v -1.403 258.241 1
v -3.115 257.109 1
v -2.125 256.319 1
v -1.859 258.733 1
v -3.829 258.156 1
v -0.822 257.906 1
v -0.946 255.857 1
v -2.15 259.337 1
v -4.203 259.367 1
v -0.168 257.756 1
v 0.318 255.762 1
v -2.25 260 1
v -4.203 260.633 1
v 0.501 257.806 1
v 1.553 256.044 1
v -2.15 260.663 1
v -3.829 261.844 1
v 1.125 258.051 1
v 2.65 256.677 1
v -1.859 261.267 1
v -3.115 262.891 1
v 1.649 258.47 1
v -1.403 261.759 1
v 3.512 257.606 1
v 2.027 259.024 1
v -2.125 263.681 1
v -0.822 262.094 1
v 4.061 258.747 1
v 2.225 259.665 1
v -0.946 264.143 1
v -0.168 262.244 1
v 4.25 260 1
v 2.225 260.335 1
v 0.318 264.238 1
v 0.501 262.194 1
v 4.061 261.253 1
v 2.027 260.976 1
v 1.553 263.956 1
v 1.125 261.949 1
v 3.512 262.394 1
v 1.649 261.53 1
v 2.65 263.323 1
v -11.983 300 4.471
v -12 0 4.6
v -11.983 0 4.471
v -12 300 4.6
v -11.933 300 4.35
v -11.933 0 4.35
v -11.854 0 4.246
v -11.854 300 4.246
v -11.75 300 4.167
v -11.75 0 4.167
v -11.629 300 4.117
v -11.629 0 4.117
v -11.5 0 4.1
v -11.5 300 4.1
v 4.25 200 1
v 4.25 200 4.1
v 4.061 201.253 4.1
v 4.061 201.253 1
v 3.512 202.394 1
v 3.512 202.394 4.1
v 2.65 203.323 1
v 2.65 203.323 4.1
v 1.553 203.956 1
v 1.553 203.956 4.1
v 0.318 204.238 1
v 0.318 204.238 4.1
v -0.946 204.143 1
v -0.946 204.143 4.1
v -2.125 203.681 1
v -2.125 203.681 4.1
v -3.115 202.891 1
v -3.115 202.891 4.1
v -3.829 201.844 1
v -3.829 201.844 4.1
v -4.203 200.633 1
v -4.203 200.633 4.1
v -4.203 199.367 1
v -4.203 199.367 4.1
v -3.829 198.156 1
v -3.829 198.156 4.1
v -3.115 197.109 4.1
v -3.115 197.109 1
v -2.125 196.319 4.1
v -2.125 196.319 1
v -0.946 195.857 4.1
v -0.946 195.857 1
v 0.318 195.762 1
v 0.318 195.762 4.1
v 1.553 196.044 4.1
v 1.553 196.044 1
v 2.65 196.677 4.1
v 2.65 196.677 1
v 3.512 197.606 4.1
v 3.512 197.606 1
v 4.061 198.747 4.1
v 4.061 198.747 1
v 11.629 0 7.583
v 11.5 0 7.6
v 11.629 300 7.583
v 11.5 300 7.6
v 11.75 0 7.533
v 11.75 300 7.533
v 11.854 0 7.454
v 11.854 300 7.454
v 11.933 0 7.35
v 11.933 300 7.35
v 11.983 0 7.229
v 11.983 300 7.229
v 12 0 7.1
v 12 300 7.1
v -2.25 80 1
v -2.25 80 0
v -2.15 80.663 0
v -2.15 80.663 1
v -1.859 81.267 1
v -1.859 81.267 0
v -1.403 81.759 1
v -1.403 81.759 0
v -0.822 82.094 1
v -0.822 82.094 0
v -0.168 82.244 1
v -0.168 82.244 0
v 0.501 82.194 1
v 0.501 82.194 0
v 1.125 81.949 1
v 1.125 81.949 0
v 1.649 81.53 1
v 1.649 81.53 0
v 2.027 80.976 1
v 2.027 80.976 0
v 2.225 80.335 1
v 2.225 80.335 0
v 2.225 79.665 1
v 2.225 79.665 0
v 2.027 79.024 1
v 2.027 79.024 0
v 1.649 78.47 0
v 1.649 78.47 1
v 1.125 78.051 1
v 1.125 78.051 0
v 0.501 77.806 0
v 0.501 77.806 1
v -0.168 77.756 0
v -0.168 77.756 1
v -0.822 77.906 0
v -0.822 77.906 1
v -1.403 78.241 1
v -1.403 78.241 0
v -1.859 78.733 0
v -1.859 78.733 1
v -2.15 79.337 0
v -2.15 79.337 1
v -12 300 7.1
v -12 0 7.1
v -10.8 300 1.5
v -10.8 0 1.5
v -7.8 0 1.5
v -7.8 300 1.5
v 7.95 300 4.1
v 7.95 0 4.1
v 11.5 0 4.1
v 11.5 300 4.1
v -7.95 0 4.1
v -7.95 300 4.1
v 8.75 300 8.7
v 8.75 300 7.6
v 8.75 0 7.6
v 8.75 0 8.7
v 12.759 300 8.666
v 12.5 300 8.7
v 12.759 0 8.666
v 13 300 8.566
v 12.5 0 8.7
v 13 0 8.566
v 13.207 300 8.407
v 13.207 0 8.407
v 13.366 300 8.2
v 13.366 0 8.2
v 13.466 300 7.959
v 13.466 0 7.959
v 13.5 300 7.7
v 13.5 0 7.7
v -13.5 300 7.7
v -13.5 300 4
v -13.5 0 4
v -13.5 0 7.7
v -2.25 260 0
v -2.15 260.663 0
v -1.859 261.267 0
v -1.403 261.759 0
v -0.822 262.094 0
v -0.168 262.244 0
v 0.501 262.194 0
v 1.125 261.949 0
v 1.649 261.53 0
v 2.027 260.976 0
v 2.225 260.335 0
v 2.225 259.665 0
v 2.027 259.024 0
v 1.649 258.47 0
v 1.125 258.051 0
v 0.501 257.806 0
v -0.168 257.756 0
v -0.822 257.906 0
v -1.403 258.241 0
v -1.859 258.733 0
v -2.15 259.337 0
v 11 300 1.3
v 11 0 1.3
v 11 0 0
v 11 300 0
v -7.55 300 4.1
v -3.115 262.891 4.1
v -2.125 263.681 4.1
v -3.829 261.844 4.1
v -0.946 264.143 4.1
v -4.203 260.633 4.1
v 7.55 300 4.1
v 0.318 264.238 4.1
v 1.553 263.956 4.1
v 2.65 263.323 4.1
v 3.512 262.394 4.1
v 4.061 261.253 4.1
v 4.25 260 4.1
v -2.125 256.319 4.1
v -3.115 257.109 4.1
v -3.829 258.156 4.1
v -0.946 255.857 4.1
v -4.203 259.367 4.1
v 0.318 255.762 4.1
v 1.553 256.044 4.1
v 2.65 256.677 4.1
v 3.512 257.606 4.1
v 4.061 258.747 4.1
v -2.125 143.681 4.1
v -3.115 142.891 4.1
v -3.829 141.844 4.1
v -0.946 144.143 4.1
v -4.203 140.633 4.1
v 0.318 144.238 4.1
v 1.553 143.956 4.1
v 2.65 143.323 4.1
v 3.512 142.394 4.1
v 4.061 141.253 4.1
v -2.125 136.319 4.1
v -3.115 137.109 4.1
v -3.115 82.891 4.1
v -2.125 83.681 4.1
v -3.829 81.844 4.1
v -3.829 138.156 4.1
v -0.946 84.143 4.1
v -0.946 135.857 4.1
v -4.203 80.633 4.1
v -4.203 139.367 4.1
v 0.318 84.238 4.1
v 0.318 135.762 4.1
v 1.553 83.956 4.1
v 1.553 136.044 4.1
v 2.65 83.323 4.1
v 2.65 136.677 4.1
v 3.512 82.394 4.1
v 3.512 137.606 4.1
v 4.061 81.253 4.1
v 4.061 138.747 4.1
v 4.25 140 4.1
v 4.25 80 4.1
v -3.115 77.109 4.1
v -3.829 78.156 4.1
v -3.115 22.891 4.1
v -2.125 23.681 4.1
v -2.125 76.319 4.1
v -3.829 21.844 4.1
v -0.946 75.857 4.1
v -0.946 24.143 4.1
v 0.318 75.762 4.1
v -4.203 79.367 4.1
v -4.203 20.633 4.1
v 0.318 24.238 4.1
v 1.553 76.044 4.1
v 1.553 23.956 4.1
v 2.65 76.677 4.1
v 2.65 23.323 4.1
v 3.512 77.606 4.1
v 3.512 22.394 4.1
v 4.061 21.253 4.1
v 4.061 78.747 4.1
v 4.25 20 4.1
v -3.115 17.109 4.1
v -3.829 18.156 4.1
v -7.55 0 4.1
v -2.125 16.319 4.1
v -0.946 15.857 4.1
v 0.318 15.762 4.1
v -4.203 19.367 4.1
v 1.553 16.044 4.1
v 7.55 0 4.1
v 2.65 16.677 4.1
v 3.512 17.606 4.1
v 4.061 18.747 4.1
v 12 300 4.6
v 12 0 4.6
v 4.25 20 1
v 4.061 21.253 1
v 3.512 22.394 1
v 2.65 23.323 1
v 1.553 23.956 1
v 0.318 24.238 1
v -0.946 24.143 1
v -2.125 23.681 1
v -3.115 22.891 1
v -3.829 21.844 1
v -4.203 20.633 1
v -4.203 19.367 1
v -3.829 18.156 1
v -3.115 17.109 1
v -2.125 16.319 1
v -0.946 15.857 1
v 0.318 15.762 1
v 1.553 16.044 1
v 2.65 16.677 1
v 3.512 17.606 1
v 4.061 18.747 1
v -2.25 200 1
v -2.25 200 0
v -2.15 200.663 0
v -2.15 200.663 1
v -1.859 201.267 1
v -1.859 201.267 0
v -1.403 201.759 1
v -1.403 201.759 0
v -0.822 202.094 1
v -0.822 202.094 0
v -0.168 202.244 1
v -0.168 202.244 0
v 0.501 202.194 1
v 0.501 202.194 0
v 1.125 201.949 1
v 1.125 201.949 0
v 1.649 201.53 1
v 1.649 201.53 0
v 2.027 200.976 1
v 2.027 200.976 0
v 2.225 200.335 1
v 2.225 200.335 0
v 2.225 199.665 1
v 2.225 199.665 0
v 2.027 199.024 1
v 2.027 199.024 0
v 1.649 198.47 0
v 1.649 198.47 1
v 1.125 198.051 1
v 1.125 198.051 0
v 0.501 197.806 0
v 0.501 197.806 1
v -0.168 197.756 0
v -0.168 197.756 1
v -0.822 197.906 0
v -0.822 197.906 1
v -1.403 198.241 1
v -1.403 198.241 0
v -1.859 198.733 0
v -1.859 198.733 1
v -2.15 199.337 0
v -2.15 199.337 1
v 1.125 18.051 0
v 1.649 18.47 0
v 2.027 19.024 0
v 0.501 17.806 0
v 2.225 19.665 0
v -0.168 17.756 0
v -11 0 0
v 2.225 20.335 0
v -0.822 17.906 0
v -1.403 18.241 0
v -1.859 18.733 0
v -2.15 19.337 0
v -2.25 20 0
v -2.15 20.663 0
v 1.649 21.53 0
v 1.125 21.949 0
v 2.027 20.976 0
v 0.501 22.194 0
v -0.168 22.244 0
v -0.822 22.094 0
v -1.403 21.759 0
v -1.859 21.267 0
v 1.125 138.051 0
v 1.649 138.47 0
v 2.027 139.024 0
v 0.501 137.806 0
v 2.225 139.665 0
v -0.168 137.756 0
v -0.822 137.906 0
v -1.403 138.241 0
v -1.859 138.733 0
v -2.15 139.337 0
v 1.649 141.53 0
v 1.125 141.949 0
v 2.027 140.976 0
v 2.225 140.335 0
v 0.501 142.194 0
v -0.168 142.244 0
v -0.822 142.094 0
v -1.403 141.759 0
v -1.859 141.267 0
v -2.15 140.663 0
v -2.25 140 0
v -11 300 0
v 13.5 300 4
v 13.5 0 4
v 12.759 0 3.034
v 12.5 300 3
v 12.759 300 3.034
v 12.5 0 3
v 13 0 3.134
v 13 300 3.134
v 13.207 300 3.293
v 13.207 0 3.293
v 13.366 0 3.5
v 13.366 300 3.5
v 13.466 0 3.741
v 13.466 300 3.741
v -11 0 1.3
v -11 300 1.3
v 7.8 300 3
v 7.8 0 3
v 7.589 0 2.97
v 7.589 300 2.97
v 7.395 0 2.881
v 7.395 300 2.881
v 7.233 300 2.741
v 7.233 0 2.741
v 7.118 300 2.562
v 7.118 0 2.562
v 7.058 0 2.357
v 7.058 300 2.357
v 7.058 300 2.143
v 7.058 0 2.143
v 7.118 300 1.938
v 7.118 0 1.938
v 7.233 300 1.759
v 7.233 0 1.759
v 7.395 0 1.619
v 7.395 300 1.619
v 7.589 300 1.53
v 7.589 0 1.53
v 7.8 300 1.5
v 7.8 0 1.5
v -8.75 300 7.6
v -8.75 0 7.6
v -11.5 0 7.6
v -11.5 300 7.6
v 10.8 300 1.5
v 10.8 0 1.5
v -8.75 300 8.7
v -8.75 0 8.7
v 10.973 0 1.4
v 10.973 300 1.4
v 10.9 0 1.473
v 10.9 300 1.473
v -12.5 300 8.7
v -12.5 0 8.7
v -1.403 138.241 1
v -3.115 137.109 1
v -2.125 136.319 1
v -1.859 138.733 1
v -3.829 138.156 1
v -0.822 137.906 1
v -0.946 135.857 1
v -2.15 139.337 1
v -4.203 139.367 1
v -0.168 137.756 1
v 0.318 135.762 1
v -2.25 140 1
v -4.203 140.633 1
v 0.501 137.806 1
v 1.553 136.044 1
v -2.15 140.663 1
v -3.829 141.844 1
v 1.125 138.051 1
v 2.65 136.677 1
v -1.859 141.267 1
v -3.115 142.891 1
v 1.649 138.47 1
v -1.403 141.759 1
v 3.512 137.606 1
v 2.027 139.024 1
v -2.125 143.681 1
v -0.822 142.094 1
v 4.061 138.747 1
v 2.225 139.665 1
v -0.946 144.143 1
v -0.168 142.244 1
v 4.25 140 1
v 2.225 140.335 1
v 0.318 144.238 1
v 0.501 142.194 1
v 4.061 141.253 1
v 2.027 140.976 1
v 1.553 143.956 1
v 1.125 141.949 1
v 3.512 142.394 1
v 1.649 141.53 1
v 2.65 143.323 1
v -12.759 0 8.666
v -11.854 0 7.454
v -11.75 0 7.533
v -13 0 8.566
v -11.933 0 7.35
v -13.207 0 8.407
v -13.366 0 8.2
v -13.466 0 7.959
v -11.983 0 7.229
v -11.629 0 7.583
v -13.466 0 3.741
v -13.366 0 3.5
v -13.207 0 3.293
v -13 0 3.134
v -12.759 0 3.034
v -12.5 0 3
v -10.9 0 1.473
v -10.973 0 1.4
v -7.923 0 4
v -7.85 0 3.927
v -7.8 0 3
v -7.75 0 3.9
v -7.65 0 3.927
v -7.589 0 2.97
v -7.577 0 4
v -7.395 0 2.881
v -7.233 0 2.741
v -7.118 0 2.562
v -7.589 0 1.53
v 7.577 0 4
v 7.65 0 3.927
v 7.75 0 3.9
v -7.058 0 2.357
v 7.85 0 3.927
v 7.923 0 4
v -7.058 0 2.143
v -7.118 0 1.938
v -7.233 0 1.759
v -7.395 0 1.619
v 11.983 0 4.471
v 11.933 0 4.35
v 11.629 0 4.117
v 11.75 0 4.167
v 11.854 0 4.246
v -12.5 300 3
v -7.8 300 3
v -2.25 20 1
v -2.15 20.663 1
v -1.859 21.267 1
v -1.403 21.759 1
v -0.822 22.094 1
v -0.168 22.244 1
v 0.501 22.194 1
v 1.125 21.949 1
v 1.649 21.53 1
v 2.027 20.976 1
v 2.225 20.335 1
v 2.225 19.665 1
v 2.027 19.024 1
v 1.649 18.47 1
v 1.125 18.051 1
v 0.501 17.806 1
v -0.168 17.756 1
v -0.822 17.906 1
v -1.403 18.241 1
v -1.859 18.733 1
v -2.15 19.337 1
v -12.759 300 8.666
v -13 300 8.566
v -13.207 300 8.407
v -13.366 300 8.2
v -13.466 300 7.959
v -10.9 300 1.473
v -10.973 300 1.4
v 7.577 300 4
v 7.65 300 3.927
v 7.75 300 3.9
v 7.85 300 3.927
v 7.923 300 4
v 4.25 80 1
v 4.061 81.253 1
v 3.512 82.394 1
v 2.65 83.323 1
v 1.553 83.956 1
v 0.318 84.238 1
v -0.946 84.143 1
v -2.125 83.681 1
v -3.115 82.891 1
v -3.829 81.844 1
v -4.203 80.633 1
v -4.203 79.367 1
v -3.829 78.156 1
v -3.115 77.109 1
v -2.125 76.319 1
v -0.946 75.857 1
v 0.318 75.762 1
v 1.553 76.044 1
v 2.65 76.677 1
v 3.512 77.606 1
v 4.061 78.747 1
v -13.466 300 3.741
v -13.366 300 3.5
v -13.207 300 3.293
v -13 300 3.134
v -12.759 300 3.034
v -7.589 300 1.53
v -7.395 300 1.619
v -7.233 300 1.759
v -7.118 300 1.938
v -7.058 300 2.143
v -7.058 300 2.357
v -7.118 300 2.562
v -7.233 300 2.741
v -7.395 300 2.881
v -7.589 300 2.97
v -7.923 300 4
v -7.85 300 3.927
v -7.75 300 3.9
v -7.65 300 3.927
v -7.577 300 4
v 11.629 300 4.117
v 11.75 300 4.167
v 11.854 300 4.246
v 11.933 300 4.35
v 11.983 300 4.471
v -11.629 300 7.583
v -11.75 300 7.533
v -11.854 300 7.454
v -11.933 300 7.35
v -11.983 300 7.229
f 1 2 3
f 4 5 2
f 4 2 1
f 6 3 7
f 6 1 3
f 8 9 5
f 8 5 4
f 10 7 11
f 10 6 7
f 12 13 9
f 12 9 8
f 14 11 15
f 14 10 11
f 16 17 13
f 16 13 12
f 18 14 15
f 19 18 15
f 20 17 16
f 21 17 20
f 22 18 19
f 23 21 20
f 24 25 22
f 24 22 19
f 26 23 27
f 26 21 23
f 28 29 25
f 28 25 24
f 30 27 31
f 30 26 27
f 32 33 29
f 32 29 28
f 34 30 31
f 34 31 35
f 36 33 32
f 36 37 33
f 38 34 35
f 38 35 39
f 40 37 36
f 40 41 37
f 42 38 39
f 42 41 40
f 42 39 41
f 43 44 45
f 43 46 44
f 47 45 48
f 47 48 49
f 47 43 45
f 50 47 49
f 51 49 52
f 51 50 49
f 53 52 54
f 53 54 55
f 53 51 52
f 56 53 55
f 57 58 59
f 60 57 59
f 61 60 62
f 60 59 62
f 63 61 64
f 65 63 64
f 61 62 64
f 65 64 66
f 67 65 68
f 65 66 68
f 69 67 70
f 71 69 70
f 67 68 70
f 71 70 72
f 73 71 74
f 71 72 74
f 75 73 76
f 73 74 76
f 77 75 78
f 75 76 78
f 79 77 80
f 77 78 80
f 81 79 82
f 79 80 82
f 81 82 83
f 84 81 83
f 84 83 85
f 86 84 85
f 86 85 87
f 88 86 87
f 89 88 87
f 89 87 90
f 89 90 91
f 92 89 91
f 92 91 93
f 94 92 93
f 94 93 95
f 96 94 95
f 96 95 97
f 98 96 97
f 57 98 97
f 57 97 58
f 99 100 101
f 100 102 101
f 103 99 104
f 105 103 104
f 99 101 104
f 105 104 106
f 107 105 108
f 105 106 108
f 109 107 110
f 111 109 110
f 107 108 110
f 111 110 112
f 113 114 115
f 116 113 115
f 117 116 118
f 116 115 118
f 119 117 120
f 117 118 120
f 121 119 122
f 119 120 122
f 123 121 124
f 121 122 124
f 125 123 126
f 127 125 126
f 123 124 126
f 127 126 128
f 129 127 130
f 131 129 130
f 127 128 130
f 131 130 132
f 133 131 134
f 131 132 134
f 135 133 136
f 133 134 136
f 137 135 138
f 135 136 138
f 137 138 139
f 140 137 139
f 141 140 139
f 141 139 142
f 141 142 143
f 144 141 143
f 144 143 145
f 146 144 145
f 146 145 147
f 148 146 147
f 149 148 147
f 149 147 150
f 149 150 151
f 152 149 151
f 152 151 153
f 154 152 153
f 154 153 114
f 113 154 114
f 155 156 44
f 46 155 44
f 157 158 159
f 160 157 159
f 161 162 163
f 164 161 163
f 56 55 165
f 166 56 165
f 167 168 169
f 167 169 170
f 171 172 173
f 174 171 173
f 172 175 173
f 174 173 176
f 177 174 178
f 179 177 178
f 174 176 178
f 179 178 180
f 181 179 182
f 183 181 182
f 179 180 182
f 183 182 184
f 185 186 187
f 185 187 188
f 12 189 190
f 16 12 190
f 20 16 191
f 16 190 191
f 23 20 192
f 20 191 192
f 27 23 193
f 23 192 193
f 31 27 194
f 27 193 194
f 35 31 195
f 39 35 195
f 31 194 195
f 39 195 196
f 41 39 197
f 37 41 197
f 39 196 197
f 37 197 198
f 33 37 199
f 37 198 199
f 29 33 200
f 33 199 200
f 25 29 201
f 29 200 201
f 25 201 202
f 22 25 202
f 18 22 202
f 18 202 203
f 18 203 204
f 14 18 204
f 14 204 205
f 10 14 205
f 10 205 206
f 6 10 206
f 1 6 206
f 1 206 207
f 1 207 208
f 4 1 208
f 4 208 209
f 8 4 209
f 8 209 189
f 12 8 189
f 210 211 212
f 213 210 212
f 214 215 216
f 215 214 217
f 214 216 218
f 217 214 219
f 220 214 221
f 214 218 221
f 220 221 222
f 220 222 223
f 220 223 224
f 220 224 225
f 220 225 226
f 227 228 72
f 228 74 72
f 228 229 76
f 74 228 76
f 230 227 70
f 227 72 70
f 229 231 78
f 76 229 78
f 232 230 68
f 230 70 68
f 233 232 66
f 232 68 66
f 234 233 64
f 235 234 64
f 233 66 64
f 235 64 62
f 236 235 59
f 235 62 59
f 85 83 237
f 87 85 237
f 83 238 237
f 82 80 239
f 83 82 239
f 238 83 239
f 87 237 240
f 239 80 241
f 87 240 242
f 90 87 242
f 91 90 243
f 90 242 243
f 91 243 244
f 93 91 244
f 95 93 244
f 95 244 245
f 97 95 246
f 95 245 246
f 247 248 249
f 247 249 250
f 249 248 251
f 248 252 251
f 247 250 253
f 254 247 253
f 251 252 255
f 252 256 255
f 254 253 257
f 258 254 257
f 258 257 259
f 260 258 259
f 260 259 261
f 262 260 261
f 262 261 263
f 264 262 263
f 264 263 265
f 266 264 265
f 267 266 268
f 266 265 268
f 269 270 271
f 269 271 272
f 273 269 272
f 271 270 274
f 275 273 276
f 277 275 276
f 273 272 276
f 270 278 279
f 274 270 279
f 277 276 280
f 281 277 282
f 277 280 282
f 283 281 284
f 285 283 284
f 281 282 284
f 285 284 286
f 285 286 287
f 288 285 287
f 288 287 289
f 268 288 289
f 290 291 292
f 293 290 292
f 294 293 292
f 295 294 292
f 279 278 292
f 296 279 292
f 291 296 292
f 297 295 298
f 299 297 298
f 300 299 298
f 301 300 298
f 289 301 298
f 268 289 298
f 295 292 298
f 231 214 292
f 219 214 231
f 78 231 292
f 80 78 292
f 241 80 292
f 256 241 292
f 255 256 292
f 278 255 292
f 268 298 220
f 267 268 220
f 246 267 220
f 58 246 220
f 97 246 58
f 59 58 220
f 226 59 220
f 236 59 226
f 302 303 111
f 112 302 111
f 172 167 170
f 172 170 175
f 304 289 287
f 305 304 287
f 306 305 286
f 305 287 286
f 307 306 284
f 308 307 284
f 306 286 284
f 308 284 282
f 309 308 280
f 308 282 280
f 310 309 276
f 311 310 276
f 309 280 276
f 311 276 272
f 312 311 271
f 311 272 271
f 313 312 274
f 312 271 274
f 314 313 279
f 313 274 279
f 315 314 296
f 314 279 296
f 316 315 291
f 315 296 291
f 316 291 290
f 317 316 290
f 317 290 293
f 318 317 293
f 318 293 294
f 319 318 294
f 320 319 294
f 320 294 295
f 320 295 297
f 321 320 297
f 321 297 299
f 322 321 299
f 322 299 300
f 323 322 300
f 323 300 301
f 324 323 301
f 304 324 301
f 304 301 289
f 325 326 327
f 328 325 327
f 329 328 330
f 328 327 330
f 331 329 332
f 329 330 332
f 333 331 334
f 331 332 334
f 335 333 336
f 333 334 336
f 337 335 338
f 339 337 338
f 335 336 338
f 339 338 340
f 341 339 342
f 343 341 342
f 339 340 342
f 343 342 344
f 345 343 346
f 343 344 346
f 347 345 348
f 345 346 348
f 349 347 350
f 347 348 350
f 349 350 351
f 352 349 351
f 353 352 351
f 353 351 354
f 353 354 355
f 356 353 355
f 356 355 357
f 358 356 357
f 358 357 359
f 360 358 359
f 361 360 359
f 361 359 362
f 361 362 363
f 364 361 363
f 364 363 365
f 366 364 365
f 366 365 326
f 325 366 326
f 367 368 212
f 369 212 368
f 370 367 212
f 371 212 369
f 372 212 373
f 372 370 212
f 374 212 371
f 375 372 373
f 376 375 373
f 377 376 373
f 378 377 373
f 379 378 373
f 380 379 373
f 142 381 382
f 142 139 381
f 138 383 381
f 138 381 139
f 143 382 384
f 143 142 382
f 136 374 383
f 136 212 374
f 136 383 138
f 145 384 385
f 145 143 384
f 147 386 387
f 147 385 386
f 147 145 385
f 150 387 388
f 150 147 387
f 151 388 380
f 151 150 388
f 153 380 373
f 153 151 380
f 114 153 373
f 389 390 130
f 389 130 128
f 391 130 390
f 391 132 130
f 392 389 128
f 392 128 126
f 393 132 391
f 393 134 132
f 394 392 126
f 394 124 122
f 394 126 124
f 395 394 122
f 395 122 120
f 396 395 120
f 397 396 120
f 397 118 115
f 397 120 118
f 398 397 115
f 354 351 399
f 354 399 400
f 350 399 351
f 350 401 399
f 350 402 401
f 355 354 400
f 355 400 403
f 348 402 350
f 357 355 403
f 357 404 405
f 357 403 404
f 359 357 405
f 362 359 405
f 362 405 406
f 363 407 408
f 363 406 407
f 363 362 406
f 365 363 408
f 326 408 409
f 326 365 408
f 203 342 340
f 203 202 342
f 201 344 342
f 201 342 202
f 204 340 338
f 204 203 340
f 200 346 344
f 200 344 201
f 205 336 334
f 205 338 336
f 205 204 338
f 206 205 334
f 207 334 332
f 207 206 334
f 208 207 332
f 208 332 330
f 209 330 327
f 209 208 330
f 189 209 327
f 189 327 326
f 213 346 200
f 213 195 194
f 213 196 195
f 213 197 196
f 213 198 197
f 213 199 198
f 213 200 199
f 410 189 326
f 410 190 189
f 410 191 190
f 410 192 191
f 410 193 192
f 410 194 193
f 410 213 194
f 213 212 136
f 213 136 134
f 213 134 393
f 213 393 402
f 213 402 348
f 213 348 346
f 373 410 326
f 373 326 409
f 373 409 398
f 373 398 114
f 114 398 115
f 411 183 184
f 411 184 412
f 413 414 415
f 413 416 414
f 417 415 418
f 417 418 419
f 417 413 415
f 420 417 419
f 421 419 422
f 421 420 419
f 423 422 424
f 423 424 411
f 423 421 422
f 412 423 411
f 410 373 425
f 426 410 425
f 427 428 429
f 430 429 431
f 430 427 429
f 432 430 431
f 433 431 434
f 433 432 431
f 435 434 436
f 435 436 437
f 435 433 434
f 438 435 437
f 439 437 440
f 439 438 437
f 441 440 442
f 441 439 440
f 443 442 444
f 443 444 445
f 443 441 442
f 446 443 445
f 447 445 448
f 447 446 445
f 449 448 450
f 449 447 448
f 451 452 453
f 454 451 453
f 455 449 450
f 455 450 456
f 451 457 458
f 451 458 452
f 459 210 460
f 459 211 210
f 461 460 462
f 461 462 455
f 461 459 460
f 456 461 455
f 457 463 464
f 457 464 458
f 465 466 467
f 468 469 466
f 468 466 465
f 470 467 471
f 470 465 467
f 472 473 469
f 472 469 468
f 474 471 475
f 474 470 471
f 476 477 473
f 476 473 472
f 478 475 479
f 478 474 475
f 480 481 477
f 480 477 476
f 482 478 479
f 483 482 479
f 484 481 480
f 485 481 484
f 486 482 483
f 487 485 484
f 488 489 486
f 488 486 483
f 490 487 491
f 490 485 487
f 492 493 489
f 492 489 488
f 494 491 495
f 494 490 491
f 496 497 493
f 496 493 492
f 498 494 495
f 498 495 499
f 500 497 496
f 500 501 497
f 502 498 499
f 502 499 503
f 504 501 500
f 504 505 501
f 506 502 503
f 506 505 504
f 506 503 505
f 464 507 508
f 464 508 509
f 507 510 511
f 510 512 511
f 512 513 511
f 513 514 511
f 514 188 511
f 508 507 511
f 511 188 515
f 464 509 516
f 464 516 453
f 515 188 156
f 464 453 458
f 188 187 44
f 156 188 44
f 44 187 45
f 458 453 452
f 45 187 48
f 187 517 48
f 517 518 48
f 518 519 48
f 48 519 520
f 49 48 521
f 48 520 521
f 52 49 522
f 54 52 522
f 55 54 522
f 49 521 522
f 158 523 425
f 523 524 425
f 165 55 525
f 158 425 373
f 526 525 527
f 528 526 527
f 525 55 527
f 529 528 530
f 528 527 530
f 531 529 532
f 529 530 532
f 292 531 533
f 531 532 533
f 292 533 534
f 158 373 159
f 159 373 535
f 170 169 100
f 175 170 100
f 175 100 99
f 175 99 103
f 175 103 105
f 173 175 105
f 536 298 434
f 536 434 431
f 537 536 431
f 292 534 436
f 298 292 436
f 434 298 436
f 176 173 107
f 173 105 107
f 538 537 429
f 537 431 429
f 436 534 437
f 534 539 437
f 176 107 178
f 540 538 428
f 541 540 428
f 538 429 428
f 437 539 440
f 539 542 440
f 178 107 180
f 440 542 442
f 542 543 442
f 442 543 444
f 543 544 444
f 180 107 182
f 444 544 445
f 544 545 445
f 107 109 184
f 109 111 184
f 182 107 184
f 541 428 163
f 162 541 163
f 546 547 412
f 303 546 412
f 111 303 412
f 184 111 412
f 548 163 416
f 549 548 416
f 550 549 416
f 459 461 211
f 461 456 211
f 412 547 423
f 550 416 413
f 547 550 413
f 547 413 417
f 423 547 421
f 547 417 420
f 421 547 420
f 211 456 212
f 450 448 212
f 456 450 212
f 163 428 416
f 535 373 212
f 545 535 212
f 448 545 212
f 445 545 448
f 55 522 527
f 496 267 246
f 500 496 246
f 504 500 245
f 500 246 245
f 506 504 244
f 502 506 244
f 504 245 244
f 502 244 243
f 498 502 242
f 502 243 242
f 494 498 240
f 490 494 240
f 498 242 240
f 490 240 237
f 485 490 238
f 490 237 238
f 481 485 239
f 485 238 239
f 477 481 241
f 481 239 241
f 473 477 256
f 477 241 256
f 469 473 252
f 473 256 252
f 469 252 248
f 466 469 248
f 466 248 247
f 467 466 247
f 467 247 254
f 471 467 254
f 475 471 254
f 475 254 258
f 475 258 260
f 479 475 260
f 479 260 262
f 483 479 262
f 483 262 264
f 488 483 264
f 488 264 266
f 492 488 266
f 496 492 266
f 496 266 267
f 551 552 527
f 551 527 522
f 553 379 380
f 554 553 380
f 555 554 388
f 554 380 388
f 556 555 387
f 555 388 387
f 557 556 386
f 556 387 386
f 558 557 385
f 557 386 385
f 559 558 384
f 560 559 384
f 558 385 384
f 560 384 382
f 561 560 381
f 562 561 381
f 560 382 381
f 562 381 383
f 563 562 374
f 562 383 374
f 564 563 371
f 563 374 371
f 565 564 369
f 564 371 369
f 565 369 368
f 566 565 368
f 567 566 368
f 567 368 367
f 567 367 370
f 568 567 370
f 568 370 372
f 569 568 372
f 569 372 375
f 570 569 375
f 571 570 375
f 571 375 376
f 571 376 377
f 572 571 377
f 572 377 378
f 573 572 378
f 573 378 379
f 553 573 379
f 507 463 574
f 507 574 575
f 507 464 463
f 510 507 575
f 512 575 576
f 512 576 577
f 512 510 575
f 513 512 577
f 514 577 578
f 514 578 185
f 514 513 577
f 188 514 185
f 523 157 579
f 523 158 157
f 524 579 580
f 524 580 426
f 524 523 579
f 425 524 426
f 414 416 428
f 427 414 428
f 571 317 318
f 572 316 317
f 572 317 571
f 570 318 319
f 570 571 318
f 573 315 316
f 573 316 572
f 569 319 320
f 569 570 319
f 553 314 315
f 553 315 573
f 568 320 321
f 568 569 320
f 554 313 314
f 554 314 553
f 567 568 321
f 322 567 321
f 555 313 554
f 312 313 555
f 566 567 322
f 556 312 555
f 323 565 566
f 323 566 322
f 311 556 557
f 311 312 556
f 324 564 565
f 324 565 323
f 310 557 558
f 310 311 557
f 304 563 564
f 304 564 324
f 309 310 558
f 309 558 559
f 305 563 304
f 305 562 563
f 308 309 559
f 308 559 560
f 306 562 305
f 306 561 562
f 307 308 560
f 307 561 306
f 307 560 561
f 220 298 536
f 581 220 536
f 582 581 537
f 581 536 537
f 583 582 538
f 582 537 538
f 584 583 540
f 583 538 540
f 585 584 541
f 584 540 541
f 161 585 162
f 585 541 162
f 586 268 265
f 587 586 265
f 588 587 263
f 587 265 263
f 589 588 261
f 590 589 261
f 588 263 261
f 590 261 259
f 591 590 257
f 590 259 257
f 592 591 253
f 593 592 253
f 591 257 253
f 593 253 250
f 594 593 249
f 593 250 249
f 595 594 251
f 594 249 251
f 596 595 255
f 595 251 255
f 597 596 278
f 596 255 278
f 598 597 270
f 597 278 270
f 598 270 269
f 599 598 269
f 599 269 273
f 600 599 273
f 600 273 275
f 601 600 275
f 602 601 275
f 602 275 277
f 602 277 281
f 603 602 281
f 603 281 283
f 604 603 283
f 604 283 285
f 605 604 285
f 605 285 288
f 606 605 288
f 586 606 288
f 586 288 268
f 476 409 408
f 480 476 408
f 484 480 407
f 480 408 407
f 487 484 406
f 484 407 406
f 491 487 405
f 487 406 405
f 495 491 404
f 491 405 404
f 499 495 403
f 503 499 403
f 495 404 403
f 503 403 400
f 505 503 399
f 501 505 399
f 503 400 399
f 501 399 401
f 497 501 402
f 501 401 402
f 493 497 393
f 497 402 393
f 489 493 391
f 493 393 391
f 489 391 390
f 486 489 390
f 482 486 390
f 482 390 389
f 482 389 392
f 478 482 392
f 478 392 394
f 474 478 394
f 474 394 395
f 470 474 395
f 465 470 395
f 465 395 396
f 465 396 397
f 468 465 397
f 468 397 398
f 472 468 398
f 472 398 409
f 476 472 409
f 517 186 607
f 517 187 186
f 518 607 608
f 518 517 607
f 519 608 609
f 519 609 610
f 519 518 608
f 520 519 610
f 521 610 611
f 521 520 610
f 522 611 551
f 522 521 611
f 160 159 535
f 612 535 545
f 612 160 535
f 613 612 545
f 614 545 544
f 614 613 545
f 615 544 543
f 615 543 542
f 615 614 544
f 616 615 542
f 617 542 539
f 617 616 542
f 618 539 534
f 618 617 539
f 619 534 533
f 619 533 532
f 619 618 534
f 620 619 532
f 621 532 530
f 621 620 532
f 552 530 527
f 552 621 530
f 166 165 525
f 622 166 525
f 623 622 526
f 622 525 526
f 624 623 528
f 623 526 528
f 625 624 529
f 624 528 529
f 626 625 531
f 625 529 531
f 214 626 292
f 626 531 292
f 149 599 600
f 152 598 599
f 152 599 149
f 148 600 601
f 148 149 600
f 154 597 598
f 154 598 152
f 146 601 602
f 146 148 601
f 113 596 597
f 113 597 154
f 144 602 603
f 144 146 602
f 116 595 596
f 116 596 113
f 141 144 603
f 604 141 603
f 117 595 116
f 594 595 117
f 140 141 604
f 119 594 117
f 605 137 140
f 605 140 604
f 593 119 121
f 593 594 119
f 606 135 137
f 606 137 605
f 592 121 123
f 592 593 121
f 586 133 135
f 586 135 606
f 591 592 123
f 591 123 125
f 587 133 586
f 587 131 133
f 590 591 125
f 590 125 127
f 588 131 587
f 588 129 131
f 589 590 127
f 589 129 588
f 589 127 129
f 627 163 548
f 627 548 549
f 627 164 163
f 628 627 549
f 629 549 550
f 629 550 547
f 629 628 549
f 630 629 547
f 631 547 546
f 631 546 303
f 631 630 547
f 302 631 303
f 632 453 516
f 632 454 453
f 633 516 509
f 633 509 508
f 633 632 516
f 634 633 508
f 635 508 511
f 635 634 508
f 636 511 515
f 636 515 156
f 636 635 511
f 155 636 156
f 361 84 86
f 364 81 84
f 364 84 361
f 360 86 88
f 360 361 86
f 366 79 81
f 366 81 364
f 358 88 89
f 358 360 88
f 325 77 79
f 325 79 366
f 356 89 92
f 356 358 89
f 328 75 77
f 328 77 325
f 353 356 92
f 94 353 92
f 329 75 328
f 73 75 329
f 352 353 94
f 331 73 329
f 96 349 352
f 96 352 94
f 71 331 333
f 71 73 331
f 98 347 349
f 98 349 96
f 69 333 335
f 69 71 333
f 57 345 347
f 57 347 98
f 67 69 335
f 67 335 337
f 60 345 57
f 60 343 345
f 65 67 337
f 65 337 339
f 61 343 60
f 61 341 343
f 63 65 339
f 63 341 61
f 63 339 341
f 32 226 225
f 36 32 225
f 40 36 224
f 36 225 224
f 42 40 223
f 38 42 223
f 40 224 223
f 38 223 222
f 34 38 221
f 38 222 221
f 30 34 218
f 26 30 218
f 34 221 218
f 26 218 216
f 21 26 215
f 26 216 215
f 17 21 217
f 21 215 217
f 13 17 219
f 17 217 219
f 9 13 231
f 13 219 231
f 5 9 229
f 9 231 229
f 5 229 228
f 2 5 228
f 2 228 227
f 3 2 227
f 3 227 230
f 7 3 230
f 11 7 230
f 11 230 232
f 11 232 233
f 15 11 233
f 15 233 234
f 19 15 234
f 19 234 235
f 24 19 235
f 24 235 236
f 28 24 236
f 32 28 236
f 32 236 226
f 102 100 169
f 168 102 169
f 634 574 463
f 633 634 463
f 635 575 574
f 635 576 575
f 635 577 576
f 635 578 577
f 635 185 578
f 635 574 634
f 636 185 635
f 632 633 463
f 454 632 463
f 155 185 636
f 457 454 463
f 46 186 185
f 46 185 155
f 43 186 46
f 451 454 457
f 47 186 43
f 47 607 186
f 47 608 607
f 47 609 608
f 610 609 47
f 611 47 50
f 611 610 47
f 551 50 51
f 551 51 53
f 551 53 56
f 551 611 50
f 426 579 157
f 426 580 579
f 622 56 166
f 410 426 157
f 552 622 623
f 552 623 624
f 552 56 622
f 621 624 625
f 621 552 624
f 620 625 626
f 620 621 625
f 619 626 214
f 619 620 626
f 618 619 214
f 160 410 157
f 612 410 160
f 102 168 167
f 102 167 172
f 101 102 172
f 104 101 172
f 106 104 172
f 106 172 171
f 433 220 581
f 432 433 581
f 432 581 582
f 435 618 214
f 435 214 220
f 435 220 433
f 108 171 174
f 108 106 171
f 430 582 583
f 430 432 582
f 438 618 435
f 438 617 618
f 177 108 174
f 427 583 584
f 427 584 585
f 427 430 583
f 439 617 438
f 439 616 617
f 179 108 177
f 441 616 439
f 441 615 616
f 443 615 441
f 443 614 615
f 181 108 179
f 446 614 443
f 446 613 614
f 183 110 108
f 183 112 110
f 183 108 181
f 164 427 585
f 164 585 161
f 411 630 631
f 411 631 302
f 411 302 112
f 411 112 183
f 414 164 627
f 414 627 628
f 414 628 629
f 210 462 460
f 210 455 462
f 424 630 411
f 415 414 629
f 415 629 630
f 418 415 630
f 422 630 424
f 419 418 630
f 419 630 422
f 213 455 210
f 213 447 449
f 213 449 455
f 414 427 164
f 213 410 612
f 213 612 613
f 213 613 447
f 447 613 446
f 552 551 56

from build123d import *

# Parameters (mm, degrees)
BOSS_EXTRUDE1_DEPTH                              = 300
CUT_EXTRUDE1_DEPTH                               = 301
F_0_4_0_4_DIAMETER_HOLE1_D                       = 0.4
F_0_4_0_4_DIAMETER_HOLE1_DEPTH                   = 300
CBORE_FOR_M4_HEX_HEAD_MACHINE_SCREW1_D           = 4.5
CBORE_FOR_M4_HEX_HEAD_MACHINE_SCREW1_DEPTH       = 4.1
CBORE_FOR_M4_HEX_HEAD_MACHINE_SCREW1_CBORE_D     = 8.5
CBORE_FOR_M4_HEX_HEAD_MACHINE_SCREW1_CBORE_DEPTH = 3.1
FILLET1_R                                        = 0.2
FILLET2_R                                        = 0.5
FILLET3_R                                        = 1


with BuildPart() as part:
    # Sketch1 → Boss-Extrude1 (new body)
    with BuildSketch(Plane(origin=(0, 300, 0), x_dir=(1, 0, 0), z_dir=(0, 1, 0))):
        with BuildLine():
            Line((-13.5, -3), (-13.5, -8.7))
            Line((-13.5, -8.7), (13.5, -8.7))
            Line((13.5, -8.7), (13.5, -3))
            Line((13.5, -3), (7.8, -3))
            ThreePointArc((7.8, -3), (7.05, -2.25), (7.8, -1.5))
            Line((7.8, -1.5), (11, -1.5))
            Line((11, -1.5), (11, 0))
            Line((11, 0), (-11, 0))
            Line((-11, 0), (-11, -1.5))
            Line((-11, -1.5), (-7.8, -1.5))
            ThreePointArc((-7.8, -1.5), (-7.05, -2.25), (-7.8, -3))
            Line((-7.8, -3), (-13.5, -3))
        make_face()
    extrude(amount=-BOSS_EXTRUDE1_DEPTH)

    # Sketch2 → Cut-Extrude1 (cut, through all)
    with BuildSketch(Plane.XZ):
        Polygon((8.75, 8.7), (-8.75, 8.7), (-8.75, 7.6), (-12, 7.6), (-12, 4.1), (12, 4.1), (12, 7.6), (8.75, 7.6), align=None)
    extrude(amount=-CUT_EXTRUDE1_DEPTH, mode=Mode.SUBTRACT)

    # Ø0.4 (0.4) Diameter Hole1
    with Locations(Plane(origin=(0, 300, 0), x_dir=(1, 0, 0), z_dir=(0, 1, 0))):
        with Locations((-7.75, -4.1), (7.75, -4.1)):
            Hole(F_0_4_0_4_DIAMETER_HOLE1_D / 2, depth=F_0_4_0_4_DIAMETER_HOLE1_DEPTH)

    # CBORE for M4 Hex Head Machine Screw1
    with Locations(Plane.XY.offset(4.1)):
        with Locations((0, 260), (0, 200), (0, 140), (0, 80), (0, 20)):
            CounterBoreHole(CBORE_FOR_M4_HEX_HEAD_MACHINE_SCREW1_D / 2, CBORE_FOR_M4_HEX_HEAD_MACHINE_SCREW1_CBORE_D / 2, CBORE_FOR_M4_HEX_HEAD_MACHINE_SCREW1_CBORE_DEPTH, depth=CBORE_FOR_M4_HEX_HEAD_MACHINE_SCREW1_DEPTH)

    # Fillet1
    fillet1_edges = [part.edges().sort_by_distance(p)[0] for p in [
        (-11, 150, 1.5),
        (11, 150, 1.5),
    ]]
    fillet(fillet1_edges, radius=FILLET1_R)

    # Fillet2
    fillet2_edges = [part.edges().sort_by_distance(p)[0] for p in [
        (12, 150, 7.6),
        (12, 150, 4.1),
        (-12, 150, 4.1),
        (-12, 150, 7.6),
    ]]
    fillet(fillet2_edges, radius=FILLET2_R)

    # Fillet3
    fillet3_edges = [part.edges().sort_by_distance(p)[0] for p in [
        (13.5, 150, 3),
        (13.5, 150, 8.7),
        (-13.5, 150, 8.7),
        (-13.5, 150, 3),
    ]]
    fillet(fillet3_edges, radius=FILLET3_R)


solid = part.part
